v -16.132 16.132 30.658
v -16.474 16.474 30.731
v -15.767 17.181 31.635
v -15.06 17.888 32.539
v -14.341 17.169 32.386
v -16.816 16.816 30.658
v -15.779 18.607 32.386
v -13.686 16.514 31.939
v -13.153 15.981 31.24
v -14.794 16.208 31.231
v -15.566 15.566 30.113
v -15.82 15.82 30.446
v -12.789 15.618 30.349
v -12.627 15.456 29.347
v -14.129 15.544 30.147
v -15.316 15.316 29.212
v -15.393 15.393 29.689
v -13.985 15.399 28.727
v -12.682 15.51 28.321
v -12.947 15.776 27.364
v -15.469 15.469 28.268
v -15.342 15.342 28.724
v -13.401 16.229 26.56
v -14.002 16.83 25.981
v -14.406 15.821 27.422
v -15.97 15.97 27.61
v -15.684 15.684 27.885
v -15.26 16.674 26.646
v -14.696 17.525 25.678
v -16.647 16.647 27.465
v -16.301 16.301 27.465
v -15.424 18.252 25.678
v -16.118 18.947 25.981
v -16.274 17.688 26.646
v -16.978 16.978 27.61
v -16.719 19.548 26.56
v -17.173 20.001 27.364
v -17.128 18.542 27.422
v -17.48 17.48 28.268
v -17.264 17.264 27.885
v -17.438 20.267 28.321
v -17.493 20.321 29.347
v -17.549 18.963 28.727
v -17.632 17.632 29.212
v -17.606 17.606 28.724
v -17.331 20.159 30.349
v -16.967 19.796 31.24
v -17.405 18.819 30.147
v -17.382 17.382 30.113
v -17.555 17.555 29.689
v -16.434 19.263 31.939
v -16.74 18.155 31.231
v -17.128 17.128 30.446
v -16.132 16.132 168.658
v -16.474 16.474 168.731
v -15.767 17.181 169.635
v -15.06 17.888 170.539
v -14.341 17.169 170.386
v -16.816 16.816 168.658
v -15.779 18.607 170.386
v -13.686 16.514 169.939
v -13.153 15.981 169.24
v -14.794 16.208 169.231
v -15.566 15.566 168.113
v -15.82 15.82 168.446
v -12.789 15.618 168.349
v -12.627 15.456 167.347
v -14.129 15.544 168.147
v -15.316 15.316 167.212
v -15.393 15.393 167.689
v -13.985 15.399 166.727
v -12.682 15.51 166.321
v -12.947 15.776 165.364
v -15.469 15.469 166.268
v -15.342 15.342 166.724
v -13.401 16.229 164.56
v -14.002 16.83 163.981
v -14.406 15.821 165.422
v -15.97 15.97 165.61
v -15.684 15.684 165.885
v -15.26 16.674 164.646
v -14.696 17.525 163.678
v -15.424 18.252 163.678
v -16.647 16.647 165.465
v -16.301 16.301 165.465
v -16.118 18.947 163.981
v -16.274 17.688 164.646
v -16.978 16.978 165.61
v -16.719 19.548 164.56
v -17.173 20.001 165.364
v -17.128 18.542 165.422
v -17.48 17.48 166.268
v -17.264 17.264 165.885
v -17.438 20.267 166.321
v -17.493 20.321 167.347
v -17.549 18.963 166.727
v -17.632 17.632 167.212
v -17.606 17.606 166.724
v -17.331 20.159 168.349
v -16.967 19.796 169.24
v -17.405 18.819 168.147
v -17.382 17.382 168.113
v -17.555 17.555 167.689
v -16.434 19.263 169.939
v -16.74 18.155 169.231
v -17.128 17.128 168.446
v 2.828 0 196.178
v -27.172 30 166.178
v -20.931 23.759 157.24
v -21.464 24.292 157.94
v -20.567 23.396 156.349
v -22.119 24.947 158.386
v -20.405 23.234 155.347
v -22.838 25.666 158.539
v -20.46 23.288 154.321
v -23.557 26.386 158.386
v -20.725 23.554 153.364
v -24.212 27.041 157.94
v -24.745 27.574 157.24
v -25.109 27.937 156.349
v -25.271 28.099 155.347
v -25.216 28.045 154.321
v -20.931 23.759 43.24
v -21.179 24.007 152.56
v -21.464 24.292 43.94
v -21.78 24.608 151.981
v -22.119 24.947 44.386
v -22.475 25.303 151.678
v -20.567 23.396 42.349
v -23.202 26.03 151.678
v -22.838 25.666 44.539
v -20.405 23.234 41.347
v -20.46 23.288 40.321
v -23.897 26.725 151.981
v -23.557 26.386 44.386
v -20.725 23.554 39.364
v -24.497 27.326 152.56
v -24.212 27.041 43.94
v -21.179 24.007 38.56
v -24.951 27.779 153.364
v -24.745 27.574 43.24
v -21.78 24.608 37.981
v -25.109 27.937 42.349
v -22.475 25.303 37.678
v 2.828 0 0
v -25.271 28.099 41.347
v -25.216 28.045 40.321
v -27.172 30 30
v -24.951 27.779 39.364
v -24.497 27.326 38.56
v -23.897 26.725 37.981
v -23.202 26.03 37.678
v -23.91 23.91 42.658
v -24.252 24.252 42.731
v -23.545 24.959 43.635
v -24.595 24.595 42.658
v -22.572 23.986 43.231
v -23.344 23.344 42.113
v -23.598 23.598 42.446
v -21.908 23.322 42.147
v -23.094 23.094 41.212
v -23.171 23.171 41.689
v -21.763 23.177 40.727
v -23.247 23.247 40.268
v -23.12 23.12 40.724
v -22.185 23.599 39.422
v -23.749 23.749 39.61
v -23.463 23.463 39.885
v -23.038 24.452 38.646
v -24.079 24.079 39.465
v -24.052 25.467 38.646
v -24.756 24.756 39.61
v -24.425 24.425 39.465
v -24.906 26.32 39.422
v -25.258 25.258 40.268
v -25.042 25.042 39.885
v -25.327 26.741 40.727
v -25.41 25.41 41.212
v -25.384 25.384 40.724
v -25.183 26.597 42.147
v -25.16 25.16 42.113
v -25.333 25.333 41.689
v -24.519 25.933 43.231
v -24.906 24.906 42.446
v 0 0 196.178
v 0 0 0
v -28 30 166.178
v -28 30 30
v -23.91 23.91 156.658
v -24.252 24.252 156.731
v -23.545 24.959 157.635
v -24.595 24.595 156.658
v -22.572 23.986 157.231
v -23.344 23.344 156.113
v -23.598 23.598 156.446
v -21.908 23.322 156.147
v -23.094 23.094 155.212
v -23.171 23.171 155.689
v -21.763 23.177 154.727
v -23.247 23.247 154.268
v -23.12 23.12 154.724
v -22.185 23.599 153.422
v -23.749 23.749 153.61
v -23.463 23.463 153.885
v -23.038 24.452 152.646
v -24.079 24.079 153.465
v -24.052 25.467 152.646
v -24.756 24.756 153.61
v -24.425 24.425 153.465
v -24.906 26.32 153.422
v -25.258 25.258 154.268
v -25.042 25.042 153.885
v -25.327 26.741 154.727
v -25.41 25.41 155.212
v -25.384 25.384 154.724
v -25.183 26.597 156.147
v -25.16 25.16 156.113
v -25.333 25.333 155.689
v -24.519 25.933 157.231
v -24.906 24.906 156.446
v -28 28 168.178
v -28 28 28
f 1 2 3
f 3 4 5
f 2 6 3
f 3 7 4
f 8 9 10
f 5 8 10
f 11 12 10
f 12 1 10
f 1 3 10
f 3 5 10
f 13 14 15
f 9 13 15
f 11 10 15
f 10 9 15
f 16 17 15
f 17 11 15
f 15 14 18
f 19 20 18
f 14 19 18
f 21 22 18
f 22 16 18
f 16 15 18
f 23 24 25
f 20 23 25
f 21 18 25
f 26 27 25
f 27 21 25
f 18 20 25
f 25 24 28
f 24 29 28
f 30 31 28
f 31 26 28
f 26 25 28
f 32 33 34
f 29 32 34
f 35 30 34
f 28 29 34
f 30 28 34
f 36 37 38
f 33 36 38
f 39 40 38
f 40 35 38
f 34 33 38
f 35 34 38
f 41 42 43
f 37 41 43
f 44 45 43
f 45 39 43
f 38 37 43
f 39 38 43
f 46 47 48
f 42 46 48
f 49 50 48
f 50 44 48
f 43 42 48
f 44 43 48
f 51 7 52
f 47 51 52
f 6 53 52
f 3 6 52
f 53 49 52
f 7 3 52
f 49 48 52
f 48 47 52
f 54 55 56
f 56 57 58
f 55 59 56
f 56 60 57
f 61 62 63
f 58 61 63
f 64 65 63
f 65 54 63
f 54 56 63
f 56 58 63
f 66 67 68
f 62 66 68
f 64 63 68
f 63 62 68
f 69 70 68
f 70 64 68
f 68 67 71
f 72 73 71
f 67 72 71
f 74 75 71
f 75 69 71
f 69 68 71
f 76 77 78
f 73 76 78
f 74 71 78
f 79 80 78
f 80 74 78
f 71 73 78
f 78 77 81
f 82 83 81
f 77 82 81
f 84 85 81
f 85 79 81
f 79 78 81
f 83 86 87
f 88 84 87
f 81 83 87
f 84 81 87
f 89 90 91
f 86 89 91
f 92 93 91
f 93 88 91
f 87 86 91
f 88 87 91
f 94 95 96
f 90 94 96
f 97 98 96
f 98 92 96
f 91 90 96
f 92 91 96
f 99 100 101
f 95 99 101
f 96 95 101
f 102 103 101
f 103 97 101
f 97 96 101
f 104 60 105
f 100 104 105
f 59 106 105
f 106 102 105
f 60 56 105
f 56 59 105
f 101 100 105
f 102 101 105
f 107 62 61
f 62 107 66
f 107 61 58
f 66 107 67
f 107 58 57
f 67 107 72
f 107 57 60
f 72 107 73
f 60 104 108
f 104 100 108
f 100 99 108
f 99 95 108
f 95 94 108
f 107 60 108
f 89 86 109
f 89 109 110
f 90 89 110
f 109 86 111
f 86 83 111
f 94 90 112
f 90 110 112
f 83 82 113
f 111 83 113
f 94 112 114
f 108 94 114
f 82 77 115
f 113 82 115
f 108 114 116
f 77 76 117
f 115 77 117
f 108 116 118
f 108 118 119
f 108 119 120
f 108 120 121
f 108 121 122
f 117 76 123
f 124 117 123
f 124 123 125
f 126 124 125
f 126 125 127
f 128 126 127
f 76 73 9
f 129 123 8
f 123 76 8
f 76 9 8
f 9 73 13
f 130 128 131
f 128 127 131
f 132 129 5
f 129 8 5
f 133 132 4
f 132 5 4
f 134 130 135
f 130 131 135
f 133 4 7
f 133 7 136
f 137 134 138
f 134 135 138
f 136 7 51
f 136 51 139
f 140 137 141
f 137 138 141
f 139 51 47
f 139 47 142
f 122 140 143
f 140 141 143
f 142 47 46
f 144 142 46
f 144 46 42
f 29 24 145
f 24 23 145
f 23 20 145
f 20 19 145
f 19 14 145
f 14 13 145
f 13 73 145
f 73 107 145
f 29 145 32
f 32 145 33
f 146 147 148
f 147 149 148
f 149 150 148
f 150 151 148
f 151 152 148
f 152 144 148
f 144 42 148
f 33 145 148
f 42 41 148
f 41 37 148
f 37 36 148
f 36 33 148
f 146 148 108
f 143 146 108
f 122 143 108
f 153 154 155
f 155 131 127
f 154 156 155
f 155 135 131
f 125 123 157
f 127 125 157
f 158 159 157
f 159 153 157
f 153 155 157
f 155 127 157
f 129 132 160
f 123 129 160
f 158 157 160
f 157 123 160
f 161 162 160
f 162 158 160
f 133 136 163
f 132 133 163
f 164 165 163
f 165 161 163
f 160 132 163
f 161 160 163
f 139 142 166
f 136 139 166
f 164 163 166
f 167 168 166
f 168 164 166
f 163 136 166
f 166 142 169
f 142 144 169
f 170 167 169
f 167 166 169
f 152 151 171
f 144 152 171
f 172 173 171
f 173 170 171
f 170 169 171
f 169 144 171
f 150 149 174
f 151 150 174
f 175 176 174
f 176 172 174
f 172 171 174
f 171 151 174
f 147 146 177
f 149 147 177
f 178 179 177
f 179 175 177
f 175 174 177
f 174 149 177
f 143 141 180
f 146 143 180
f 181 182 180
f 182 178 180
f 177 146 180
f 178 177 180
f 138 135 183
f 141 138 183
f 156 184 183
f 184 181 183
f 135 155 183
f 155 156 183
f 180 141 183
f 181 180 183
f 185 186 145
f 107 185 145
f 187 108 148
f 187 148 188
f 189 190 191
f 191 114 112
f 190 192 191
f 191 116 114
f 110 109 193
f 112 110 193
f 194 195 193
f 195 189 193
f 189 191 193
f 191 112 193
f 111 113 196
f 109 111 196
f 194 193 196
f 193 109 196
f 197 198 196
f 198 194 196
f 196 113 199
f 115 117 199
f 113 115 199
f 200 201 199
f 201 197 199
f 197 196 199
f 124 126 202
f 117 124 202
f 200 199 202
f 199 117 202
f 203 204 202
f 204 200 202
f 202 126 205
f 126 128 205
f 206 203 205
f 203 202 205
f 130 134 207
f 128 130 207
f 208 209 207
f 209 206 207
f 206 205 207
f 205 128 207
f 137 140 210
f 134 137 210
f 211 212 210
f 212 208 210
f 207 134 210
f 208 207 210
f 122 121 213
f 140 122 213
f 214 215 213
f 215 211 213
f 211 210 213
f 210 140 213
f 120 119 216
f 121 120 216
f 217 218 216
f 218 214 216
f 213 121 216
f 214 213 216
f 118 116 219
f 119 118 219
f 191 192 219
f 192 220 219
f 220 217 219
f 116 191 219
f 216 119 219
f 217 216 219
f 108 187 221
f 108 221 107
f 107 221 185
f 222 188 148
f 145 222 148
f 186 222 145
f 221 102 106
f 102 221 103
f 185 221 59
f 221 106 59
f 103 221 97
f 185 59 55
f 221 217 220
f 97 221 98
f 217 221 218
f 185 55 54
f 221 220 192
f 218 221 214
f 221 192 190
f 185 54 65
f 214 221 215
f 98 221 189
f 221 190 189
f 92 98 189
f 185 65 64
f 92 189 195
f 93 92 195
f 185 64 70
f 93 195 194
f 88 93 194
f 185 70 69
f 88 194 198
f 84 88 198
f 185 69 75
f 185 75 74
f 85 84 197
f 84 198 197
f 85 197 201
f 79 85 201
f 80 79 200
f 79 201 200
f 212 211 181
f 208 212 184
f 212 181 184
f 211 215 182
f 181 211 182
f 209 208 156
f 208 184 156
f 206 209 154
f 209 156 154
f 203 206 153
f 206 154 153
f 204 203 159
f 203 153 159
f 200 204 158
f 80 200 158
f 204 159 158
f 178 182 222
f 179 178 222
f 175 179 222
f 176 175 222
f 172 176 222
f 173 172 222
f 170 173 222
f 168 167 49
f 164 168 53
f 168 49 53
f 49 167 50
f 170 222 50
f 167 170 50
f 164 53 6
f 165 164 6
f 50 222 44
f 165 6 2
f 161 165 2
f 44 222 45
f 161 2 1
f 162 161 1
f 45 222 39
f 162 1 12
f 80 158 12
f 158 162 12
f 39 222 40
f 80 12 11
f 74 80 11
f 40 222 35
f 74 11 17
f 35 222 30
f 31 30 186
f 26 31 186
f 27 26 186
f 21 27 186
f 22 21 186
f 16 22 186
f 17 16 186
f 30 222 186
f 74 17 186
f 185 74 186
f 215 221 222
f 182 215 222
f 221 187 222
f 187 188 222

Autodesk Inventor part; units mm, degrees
ref_plane "YZ Plane" through (0, 0, 0) normal (1, 0, 0) x (0, 1, 0)
ref_plane "XZ Plane" through (0, 0, 0) normal (0, 1, 0) x (-1, 0, 0)
ref_plane "XY Plane" through (0, 0, 0) normal (0, 0, 1) x (1, 0, 0)
sketch "Szkic1" plane through (0, 0, 0) normal (0, 0, 1) x (1, 0, 0)
  line L0 (0, 0) -> (2.8284, 0)
  line L1 (2.8284, 0) -> (-27.1716, 30)
  line L2 (-27.1716, 30) -> (-27.1716, 27.1716)
  line L3 (-27.1716, 27.1716) -> (0, 0)
  line L4 (-27.1716, 30) -> (-28, 30)
  line L5 (-28, 30) -> (-28, 28)
  line L6 (-28, 28) -> (-27.1716, 28)
  line L7 (-27.1716, 28) -> (-27.1716, 30)
  line L8 (-28, 28) -> (-27.1716, 27.1716)
  dimension "d1" = 30
  dimension "d3" = 45
  dimension "d20" = 2
  dimension "d21" = 2
extrude "Wyciągnięcie proste1" add sketch "Szkic1" along normal blind 196.178
sketch "Szkic4" plane through (-28, 28, 0) normal (-1, 0, 0) x (0, 0, 1)
  line L0 (0, 0) -> (0, -28) projected
  line L1 (0, 2) -> (196.178, 2) projected
  line L2 (0, -28) -> (0, 2)
  line L3 (0, 2) -> (30, 2)
  line L4 (30, 2) -> (0, -28)
  line L5 (98.089, 2) -> (98.089, -28) construction
  line L6 (196.178, 0) -> (196.178, -28)
  line L7 (196.178, -28) -> (196.178, 2)
  line L8 (196.178, 2) -> (166.178, 2)
  line L9 (166.178, 2) -> (196.178, -28)
  dimension "d22" = 45
extrude "Wyciągnięcie proste3" cut sketch "Szkic4" against normal through all
sketch "Szkic5" plane through (2.8284, 0, 0) normal (0.7071, 0.7071, 0) x (-0.7071, 0.7071, 0)
  line L0 (41.598, 28) -> (41.598, 168.178) construction
  line L1 (41.598, 98.089) -> (0, 98.089) construction
  line L2 (0, 0) -> (0, 196.178) construction
  point P0 (2, 0)
  point P1 (36.298, 155.089)
  point P2 (36.298, 41.089)
  point P3 (25.298, 167.089)
  point P4 (25.298, 29.089)
  dimension "d25" = 57
  dimension "d26" = 5.3
  dimension "d34" = 69
  dimension "d35" = 16.3
hole "Otwór2" at (-22.8381, 25.6665, 155.089) at (-22.8381, 25.6665, 41.089) at (-15.0599, 17.8884, 167.089) at (-15.0599, 17.8884, 29.089) direction (-0.7071, -0.7071, 0) diameter 3.2 end through all countersink diameter 6.9 countersink angle 84.225 clearance for "Śruba ze łbem stożkowym ISO 2009/7046" size "M3" standard "ISO"
properties part number "Tyl2"
